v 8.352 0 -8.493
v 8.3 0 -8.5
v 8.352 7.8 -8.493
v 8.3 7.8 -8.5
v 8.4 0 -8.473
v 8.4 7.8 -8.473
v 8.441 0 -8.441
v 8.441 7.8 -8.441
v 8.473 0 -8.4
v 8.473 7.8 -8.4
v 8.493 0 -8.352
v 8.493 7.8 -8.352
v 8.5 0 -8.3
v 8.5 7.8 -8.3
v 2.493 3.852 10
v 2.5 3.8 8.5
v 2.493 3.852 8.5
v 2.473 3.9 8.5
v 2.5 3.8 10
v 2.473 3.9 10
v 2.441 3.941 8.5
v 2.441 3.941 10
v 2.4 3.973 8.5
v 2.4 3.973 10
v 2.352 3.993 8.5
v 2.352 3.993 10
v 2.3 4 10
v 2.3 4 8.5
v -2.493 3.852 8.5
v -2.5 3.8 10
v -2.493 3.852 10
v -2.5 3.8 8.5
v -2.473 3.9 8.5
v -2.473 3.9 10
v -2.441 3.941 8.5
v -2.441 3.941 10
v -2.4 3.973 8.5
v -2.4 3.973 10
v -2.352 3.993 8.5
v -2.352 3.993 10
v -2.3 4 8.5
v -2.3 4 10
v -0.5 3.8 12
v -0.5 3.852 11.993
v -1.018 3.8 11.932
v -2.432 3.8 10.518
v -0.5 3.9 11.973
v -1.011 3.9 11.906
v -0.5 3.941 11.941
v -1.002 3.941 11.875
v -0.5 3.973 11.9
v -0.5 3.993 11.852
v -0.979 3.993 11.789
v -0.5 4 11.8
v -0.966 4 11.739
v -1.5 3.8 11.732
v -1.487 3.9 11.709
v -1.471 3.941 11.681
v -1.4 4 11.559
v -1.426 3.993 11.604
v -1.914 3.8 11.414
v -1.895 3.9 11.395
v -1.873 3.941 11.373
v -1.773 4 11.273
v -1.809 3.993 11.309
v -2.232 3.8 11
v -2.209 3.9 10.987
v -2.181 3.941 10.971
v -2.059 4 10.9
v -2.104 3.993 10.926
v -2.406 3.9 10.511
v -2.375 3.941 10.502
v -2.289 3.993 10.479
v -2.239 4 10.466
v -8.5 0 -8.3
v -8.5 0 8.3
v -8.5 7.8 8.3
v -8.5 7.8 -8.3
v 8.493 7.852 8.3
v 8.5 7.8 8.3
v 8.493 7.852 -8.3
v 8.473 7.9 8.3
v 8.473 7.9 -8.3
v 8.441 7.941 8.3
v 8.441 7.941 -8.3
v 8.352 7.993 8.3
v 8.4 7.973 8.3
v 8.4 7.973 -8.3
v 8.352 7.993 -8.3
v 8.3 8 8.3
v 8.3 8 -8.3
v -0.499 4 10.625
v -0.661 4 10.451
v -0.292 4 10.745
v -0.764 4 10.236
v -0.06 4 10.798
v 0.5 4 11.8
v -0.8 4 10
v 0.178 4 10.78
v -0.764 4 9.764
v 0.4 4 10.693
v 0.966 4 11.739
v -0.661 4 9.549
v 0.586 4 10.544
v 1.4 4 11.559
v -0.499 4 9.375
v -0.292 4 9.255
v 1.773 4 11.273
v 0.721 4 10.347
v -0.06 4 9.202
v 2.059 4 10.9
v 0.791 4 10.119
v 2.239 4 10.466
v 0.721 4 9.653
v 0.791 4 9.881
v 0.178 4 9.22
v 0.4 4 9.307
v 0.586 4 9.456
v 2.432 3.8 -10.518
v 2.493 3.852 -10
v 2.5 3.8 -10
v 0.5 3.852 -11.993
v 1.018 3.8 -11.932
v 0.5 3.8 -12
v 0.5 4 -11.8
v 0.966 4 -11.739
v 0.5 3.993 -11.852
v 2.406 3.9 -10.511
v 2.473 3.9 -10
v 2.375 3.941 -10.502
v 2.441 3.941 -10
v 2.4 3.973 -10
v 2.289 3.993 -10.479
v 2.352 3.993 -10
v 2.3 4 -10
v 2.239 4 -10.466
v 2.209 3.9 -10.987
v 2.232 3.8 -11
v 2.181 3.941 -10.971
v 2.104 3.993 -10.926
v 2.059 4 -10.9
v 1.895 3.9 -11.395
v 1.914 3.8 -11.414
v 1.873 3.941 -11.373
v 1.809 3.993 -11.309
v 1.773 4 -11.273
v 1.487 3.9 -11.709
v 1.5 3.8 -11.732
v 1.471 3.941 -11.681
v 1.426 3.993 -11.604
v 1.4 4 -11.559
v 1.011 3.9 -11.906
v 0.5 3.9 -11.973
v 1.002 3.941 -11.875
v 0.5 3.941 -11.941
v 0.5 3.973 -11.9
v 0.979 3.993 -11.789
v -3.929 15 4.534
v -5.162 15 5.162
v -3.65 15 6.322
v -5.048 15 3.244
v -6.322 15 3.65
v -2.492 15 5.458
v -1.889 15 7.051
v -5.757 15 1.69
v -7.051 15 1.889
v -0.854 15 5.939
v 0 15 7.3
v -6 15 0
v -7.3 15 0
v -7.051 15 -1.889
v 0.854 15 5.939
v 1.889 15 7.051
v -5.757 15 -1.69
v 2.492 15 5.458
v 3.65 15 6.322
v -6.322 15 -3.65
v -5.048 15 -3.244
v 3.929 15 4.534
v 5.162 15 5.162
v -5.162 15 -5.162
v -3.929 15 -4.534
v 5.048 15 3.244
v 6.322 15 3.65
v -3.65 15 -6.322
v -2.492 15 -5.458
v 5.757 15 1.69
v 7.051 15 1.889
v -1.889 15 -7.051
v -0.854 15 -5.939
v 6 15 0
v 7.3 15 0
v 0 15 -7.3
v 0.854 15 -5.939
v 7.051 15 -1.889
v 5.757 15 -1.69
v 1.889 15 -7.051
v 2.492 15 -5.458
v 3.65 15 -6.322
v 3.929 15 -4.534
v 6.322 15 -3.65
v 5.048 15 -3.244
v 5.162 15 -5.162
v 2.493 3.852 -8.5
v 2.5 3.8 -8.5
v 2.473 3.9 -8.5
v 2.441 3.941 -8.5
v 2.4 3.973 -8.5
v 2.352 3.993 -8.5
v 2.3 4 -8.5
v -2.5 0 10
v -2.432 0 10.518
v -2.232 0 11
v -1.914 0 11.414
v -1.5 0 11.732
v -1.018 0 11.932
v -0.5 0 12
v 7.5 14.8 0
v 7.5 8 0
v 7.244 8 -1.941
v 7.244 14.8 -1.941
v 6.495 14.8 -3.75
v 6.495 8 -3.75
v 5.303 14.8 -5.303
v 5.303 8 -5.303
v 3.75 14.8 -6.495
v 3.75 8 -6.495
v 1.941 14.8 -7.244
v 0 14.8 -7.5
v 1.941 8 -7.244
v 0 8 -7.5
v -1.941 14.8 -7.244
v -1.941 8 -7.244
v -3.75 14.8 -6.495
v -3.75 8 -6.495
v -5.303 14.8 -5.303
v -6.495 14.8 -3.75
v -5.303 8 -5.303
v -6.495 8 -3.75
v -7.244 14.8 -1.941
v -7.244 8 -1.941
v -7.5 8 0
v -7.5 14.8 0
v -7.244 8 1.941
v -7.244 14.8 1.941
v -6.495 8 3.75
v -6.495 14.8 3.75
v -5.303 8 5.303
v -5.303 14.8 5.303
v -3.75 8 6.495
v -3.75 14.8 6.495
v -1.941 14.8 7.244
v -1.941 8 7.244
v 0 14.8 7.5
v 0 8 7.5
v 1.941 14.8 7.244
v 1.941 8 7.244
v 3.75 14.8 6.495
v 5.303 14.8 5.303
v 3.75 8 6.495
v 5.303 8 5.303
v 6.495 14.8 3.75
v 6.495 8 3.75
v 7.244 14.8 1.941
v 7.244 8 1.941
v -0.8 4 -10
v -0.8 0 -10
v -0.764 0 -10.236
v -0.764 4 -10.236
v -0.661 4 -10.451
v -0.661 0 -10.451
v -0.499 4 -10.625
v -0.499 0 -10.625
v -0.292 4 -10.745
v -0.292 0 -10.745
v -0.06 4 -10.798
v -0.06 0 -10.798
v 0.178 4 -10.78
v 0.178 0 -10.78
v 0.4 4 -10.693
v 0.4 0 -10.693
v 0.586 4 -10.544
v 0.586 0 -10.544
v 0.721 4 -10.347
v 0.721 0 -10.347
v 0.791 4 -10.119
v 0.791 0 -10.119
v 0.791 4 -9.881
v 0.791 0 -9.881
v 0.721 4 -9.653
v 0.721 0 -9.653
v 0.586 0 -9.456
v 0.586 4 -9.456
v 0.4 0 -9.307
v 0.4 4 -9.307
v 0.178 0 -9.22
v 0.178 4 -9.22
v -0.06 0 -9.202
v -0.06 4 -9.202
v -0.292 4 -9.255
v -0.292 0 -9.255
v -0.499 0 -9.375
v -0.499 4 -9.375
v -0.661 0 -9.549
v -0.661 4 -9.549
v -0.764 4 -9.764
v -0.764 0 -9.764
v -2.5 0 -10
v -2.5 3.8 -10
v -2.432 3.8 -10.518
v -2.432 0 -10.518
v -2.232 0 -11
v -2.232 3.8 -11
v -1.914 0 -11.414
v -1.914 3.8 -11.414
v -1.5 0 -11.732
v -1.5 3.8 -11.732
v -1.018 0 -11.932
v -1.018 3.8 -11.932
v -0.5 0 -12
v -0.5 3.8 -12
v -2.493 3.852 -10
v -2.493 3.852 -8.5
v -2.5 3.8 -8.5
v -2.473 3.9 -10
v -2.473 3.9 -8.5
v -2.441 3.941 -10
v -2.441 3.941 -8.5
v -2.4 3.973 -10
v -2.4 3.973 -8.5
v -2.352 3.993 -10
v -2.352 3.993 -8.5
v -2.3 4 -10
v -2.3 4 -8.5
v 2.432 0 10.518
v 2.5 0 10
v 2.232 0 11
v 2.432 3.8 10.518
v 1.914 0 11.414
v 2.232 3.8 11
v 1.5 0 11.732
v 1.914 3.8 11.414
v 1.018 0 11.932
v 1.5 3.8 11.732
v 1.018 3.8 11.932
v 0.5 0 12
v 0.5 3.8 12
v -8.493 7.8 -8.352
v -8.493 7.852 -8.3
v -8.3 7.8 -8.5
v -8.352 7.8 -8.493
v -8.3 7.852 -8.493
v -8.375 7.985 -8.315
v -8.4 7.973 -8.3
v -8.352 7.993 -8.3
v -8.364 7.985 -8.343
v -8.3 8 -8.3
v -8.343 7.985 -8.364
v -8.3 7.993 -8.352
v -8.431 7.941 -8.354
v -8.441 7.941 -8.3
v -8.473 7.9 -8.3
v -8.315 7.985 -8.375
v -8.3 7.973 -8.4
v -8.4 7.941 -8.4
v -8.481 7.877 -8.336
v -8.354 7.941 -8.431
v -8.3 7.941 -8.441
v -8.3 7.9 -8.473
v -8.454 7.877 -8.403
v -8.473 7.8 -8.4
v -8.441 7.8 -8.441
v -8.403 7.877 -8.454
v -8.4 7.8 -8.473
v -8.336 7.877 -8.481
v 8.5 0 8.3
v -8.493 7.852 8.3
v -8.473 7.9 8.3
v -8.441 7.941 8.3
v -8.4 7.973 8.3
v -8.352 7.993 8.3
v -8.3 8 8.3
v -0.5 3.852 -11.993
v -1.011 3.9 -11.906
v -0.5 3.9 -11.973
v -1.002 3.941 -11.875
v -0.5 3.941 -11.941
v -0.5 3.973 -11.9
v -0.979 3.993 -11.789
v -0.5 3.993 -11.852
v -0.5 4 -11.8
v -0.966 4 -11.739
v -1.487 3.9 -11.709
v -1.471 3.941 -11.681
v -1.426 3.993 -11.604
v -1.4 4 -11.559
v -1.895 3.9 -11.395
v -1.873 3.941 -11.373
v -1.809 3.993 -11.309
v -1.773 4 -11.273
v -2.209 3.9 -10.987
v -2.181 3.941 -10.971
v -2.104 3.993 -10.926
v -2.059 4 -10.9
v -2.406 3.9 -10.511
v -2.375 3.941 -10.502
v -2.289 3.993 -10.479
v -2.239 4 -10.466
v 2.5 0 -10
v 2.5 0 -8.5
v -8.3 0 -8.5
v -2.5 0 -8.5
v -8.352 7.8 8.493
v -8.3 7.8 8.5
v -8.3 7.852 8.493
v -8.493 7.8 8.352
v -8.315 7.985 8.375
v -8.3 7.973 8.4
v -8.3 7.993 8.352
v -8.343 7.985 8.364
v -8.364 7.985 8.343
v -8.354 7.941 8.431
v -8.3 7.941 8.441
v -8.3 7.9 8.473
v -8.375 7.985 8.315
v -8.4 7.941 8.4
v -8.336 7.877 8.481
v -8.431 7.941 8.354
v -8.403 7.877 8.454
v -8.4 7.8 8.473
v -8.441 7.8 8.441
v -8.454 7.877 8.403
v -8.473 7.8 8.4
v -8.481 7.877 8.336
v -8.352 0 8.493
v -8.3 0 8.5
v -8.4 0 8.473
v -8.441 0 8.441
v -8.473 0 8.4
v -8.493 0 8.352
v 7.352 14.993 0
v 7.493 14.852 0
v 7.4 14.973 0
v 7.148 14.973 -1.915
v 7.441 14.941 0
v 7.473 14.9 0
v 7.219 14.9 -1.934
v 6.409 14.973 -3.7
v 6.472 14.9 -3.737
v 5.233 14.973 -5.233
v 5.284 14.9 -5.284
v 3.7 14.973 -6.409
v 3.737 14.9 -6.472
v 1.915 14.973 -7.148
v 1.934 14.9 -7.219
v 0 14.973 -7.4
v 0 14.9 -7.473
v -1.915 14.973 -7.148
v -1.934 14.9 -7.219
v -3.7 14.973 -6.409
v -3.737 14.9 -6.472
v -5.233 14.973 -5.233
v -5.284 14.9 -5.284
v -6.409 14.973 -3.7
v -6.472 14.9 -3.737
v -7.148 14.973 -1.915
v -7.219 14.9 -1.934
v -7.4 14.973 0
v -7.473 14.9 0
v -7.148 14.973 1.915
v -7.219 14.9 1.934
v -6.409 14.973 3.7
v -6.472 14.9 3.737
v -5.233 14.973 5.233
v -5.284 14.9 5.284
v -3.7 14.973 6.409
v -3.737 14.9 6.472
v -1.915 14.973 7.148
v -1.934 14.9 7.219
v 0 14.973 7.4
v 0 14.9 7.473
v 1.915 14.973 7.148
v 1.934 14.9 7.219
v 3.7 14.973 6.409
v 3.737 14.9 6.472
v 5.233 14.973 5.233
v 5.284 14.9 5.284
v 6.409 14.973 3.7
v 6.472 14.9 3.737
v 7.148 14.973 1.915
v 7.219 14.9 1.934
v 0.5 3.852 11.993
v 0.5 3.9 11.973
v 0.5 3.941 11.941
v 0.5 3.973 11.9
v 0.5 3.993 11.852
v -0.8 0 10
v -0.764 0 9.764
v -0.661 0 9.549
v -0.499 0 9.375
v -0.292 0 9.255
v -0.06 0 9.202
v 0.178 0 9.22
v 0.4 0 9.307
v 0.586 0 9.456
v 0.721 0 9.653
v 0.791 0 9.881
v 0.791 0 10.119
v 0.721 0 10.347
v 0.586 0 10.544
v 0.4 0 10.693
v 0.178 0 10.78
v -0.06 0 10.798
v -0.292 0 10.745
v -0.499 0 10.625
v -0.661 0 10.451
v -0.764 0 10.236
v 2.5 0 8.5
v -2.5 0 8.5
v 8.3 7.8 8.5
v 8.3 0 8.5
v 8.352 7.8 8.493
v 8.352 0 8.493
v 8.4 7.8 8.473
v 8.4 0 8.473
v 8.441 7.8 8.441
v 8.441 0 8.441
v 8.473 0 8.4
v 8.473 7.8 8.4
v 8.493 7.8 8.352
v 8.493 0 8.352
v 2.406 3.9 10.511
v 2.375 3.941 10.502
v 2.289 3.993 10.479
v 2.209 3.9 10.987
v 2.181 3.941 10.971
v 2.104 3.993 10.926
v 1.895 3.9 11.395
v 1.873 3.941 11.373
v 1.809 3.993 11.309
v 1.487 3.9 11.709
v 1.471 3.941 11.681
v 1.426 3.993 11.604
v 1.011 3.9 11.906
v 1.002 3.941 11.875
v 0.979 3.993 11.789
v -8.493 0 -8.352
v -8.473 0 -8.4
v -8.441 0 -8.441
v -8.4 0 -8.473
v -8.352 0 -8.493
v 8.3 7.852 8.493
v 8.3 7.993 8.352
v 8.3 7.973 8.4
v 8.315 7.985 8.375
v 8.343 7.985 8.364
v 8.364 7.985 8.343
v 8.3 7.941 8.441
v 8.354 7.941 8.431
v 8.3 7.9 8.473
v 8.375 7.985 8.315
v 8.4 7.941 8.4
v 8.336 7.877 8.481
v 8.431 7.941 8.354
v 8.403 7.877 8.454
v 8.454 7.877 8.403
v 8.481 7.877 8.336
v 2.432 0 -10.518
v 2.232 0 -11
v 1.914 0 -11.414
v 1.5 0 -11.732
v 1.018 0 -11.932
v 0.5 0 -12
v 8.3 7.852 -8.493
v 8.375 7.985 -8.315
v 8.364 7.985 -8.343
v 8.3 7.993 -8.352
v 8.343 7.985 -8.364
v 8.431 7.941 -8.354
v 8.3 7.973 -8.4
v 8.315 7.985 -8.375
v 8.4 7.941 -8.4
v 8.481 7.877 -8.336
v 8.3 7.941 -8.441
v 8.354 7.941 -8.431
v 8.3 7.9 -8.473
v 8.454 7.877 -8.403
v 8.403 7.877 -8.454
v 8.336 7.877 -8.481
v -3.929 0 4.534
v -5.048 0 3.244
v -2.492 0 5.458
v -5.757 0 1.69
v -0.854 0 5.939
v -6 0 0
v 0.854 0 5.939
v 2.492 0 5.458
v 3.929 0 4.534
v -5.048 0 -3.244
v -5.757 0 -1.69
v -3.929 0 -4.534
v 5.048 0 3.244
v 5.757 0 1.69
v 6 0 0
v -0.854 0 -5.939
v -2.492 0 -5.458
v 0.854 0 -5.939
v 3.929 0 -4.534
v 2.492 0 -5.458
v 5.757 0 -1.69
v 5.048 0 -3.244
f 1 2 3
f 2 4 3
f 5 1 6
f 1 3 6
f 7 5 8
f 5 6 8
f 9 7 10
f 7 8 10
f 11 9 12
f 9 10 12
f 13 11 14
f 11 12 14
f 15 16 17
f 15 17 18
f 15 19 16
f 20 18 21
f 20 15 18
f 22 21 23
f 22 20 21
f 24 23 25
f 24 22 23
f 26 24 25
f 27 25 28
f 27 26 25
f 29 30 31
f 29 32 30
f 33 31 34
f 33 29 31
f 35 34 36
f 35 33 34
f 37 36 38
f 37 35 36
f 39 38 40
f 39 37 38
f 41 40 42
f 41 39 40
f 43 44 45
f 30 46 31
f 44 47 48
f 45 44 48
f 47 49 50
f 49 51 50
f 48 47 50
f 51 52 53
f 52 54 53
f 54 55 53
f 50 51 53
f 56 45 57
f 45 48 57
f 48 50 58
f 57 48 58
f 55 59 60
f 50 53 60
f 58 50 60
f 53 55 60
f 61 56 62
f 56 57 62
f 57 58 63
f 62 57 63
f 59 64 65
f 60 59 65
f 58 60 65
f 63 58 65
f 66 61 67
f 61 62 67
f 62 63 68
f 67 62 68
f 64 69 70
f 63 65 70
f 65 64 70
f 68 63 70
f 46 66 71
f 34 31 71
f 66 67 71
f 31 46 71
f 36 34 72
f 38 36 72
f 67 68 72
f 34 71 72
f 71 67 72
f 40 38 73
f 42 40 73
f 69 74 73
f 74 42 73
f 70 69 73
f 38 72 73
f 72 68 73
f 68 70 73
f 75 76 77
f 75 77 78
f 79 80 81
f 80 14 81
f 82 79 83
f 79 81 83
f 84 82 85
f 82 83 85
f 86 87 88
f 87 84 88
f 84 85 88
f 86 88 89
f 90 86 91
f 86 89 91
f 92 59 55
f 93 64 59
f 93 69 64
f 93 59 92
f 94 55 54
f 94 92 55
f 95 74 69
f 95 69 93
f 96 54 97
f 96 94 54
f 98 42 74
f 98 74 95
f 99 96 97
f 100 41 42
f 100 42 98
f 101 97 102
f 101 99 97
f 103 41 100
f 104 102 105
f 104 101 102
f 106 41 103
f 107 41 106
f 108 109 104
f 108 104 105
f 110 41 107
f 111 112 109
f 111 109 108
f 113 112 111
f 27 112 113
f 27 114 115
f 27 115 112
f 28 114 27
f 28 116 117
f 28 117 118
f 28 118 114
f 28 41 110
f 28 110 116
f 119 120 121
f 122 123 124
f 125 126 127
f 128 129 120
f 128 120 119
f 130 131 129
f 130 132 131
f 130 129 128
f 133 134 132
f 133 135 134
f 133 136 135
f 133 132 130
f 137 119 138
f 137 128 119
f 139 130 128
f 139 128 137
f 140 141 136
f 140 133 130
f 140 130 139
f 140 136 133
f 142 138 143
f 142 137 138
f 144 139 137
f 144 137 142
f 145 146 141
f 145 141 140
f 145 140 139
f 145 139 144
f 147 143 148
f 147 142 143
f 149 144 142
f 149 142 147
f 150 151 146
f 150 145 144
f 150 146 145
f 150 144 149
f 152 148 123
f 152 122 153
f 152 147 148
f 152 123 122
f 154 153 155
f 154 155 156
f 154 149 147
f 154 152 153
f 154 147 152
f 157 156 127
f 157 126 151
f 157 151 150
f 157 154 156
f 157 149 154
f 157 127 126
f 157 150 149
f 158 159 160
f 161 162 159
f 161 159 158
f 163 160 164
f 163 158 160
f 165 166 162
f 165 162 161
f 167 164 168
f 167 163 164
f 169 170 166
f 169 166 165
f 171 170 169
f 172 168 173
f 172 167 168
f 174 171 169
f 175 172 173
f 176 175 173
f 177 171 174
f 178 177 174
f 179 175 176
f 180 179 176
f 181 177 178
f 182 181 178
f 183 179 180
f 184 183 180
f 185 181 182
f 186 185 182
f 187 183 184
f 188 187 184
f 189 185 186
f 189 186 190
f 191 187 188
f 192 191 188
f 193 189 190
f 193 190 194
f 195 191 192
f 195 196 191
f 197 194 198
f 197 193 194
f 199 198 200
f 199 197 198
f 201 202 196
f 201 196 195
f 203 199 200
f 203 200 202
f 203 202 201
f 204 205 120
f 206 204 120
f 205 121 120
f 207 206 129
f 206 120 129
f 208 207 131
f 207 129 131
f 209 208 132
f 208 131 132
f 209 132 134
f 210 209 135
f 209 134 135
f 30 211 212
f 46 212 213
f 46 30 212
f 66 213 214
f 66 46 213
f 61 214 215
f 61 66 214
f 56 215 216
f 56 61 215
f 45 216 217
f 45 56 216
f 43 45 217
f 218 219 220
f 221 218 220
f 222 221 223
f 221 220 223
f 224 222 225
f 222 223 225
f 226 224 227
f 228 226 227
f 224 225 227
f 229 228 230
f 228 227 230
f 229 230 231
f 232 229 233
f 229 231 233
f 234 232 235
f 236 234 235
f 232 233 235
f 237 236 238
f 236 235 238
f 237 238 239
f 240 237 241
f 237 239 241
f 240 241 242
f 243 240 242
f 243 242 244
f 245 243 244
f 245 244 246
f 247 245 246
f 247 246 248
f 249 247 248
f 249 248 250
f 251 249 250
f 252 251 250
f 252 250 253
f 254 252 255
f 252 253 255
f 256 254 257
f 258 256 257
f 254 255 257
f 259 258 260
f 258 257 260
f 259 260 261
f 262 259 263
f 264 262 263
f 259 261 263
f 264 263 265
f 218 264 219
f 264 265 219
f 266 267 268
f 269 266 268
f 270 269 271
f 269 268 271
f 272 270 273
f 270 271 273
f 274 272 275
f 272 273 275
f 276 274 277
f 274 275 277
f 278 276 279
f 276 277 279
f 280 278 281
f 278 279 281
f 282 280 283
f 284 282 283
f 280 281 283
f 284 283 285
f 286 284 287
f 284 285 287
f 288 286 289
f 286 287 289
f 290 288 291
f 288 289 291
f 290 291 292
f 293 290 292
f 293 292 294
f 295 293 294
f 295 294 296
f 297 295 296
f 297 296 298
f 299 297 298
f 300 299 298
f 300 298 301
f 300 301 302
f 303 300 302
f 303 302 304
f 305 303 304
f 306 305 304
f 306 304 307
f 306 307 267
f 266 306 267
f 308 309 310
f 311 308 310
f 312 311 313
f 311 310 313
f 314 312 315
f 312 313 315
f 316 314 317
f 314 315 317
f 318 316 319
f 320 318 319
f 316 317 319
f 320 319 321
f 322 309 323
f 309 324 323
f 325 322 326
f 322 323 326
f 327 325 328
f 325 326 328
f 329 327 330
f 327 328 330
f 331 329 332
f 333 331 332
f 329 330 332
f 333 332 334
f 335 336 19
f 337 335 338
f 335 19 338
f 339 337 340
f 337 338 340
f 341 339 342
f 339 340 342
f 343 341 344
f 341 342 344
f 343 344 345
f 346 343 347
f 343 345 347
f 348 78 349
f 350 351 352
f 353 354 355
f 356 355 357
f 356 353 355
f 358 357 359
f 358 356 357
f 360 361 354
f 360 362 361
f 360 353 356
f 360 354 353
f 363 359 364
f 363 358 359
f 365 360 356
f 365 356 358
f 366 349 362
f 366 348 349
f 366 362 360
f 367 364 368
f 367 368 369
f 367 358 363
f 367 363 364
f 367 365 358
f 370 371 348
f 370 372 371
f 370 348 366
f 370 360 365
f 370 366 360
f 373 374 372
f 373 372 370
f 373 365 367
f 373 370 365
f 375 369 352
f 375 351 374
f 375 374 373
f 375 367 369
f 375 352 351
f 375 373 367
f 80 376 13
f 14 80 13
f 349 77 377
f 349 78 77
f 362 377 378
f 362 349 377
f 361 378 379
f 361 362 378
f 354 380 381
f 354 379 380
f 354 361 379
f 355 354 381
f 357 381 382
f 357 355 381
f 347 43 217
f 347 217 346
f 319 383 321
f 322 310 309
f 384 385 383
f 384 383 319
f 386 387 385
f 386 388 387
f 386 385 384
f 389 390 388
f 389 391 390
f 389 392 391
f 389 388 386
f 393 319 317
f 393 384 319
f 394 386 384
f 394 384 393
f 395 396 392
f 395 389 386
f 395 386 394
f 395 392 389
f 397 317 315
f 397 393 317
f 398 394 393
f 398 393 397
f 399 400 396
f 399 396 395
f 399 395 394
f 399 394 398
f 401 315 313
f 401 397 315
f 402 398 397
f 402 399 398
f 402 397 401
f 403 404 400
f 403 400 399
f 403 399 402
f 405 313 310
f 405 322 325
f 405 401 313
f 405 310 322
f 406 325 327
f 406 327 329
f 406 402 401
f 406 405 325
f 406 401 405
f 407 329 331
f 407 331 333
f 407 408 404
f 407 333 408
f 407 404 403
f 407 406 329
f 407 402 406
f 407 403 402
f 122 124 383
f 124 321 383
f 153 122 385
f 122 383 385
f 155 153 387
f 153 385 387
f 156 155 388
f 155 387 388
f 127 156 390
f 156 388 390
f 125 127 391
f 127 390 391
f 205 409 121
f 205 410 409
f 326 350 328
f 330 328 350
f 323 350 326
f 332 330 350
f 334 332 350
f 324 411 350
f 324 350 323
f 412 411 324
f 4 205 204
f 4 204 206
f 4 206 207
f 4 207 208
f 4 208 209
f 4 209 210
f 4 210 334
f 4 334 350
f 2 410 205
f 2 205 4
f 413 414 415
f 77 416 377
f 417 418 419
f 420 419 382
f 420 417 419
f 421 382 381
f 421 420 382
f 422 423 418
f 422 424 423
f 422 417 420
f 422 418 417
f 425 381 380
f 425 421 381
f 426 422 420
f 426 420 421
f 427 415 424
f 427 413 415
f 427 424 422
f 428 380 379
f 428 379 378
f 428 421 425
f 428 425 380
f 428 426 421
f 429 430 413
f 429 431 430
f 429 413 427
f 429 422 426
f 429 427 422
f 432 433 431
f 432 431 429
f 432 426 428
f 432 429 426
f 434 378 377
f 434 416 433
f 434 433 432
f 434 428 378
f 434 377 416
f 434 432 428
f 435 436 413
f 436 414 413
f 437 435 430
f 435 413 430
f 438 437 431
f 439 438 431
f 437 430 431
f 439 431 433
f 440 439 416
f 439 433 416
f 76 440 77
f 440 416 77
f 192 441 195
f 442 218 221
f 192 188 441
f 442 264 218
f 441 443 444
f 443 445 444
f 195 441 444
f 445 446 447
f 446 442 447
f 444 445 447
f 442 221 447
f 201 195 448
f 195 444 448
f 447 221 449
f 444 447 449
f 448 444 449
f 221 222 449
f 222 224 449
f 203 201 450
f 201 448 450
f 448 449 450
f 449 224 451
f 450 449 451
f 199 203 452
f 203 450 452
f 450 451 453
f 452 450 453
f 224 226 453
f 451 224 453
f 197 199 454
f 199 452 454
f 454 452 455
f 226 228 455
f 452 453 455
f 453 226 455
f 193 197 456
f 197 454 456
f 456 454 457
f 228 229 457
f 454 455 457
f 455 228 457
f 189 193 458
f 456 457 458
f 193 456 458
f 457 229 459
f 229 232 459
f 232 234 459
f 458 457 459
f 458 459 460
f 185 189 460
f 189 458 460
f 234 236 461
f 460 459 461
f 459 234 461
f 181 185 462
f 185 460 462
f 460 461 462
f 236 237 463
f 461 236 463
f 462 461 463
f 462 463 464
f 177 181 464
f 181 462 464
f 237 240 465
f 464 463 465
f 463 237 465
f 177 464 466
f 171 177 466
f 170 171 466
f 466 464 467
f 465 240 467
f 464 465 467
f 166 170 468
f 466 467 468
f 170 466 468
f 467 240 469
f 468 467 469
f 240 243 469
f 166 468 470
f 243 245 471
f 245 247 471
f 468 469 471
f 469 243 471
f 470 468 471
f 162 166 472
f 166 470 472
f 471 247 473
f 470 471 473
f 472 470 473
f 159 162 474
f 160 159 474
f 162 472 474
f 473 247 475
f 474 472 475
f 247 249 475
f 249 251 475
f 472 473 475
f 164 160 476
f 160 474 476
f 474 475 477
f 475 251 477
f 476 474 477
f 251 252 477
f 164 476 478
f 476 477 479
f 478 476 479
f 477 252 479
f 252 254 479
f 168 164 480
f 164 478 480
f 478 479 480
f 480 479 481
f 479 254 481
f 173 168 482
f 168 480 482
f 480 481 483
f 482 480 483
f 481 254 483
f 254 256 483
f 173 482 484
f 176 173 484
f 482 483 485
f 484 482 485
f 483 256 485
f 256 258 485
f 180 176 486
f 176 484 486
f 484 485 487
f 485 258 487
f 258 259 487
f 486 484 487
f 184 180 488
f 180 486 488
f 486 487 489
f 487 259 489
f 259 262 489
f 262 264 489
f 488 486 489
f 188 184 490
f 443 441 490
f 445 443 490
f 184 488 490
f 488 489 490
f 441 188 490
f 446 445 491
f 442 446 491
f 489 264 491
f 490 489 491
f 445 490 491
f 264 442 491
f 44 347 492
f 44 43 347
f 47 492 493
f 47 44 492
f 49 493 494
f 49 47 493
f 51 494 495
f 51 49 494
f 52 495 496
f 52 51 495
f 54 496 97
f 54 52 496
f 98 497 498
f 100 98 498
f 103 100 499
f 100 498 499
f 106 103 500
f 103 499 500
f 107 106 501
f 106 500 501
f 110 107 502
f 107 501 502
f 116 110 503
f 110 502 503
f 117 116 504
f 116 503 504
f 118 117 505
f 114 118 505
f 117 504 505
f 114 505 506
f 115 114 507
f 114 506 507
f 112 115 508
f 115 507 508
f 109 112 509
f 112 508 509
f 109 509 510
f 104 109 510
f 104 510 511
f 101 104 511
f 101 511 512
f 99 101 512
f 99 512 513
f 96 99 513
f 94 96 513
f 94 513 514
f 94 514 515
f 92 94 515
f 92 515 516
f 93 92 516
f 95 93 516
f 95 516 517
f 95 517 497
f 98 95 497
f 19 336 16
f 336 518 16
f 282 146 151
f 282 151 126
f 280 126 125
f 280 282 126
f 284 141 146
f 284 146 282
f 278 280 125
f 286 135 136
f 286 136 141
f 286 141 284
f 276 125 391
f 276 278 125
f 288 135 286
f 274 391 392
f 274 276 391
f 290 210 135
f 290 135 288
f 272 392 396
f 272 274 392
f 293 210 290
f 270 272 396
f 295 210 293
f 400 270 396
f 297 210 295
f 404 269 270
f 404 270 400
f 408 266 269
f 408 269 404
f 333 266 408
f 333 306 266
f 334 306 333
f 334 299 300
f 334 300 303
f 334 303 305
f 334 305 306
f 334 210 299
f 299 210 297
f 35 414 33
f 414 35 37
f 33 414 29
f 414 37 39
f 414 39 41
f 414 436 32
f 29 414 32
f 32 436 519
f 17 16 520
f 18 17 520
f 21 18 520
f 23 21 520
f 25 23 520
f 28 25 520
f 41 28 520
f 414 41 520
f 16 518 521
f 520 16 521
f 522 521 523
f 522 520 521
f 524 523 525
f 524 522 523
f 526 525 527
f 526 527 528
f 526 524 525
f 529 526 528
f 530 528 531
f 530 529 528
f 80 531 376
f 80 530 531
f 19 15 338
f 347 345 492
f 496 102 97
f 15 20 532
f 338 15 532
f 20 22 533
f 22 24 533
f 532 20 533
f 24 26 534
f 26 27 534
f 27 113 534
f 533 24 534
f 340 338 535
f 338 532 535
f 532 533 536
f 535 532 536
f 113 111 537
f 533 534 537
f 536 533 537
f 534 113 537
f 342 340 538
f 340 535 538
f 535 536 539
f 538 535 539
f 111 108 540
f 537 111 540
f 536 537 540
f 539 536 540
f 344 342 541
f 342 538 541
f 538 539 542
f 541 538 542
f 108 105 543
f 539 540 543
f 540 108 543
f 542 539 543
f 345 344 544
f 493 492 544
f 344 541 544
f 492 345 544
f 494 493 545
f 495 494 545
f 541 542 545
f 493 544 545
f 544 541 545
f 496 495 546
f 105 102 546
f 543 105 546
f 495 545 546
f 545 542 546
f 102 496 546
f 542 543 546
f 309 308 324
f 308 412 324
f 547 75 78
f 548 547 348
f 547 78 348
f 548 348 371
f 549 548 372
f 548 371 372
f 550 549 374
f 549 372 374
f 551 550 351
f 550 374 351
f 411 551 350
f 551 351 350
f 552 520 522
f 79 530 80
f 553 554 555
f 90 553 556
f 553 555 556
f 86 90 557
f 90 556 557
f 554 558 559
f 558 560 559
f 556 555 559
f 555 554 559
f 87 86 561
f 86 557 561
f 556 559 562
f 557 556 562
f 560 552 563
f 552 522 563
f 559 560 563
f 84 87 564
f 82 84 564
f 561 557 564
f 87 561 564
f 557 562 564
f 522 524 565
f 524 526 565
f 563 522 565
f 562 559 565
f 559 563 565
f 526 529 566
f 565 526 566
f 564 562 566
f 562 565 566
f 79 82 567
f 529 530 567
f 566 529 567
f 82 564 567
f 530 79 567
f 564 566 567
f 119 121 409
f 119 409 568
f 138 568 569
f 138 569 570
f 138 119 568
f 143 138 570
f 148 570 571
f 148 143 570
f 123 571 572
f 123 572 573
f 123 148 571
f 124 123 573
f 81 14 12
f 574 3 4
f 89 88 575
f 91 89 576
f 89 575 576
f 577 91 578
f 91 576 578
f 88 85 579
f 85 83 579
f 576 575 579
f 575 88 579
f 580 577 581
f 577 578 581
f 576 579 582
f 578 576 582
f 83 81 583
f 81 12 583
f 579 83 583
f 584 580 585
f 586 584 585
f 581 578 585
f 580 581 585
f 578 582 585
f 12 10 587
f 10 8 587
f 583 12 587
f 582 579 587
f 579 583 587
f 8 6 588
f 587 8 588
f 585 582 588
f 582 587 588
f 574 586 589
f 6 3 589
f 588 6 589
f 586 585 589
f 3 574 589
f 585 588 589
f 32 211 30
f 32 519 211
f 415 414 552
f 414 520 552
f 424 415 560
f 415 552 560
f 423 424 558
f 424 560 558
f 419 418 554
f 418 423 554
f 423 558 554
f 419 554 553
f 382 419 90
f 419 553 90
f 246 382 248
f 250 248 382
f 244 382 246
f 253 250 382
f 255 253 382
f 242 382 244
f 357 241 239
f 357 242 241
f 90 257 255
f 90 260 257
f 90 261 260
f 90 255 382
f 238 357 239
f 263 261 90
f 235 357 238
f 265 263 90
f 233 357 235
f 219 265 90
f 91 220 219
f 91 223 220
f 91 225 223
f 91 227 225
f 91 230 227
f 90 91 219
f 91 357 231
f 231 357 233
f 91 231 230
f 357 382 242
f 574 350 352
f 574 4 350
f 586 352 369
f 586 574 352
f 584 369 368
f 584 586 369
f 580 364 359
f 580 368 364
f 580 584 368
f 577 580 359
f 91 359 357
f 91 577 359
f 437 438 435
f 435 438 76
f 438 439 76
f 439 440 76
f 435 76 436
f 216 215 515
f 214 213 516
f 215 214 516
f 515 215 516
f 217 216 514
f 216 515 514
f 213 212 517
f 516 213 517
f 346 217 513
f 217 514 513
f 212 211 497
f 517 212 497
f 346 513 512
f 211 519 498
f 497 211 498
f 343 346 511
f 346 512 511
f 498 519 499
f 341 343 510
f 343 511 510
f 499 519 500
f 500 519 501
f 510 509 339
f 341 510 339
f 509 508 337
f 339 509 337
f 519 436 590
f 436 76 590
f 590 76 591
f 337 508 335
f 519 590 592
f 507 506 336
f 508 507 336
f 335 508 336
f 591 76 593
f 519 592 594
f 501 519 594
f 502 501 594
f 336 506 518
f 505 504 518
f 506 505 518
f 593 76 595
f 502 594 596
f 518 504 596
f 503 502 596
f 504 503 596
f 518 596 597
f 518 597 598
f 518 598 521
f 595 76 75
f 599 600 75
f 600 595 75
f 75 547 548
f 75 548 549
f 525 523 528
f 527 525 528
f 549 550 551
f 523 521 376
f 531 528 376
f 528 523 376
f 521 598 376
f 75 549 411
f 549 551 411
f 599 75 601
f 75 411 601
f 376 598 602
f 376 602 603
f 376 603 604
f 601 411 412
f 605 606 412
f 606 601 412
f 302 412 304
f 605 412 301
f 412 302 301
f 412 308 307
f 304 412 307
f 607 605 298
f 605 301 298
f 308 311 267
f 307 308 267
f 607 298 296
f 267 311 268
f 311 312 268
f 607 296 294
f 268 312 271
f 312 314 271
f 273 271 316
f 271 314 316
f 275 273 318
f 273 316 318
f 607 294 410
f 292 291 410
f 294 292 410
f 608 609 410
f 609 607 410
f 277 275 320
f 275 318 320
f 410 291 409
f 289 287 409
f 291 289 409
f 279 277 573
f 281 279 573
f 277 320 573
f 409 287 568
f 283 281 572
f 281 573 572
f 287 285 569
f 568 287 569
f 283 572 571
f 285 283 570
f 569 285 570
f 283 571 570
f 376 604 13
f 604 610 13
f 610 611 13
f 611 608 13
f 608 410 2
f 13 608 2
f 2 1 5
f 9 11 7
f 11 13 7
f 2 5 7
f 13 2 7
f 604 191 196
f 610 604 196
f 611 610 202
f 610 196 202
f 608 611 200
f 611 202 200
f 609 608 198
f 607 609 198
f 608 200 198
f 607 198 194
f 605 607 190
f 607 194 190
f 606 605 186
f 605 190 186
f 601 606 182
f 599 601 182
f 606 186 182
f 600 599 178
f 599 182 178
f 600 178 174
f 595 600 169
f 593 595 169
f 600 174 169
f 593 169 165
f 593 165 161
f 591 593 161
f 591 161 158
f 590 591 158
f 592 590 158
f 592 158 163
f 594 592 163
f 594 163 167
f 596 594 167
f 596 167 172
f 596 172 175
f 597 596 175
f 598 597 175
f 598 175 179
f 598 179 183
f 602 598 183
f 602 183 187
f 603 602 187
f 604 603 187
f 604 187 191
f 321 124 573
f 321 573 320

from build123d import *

# Parameters (mm, degrees)
SKETCH1_W             = 17
SKETCH1_H             = 17
BOSS_EXTRUDE1_DEPTH   = 8
SKETCH2_W             = 5
SKETCH2_H             = 4
BOSS_EXTRUDE2_DEPTH   = 3.5
SKETCH3_W             = 5
SKETCH3_H             = 4
BOSS_EXTRUDE3_DEPTH   = 3.5
M2X0_4_TAPPED_HOLE1_D = 1.6
FILLET1_R             = 2
SKETCH8_R             = 7.5
BOSS_EXTRUDE4_DEPTH   = 7
SKETCH9_R             = 6
CUT_EXTRUDE1_DEPTH    = 16
FILLET2_R             = 0.2


with BuildPart() as part:
    # Sketch1 → Boss-Extrude1 (new body)
    with BuildSketch(Plane(origin=(0, 0, 0), x_dir=(1, 0, 0), z_dir=(0, 1, 0))):
        Rectangle(SKETCH1_W, SKETCH1_H)
    extrude(amount=BOSS_EXTRUDE1_DEPTH)

    # Sketch2 → Boss-Extrude2 (add)
    with BuildSketch(Plane.XY.offset(8.5)):
        with Locations((0, 2)):
            Rectangle(SKETCH2_W, SKETCH2_H)
    extrude(amount=BOSS_EXTRUDE2_DEPTH)

    # Sketch3 → Boss-Extrude3 (add)
    with BuildSketch(Plane(origin=(0, 0, -8.5), x_dir=(-1, 0, 0), z_dir=(0, 0, -1))):
        with Locations((0, 2)):
            Rectangle(SKETCH3_W, SKETCH3_H)
    extrude(amount=BOSS_EXTRUDE3_DEPTH)

    # M2x0.4 Tapped Hole1 (through all)
    with Locations(Plane(origin=(0, 4, 0), x_dir=(1, 0, 0), z_dir=(0, 1, 0))):
        with Locations((0, -10), (0, 10)):
            Hole(M2X0_4_TAPPED_HOLE1_D / 2)

    # Fillet1
    fillet1_edges = [part.edges().sort_by_distance(p)[0] for p in [
        (-2.5, 2, 12),
        (2.5, 2, 12),
        (-2.5, 2, -12),
        (2.5, 2, -12),
    ]]
    fillet(fillet1_edges, radius=FILLET1_R)

    # Sketch8 → Boss-Extrude4 (add)
    with BuildSketch(Plane(origin=(0, 8, 0), x_dir=(1, 0, 0), z_dir=(0, 1, 0))):
        Circle(SKETCH8_R)
    extrude(amount=BOSS_EXTRUDE4_DEPTH)

    # Sketch9 → Cut-Extrude1 (cut, through all)
    with BuildSketch(Plane(origin=(0, 15, 0), x_dir=(1, 0, 0), z_dir=(0, 1, 0))):
        Circle(SKETCH9_R)
    extrude(amount=-CUT_EXTRUDE1_DEPTH, mode=Mode.SUBTRACT)

    # Fillet2
    fillet2_edges = [part.edges().sort_by_distance(p)[0] for p in [
        (-7.5, 15, 0),
        (8.5, 4, 8.5),
        (8.5, 4, -8.5),
        (-8.5, 4, 8.5),
        (-8.5, 4, -8.5),
        (2.5, 4, 9.25),
        (1.914213562, 4, 11.414213562),
        (-1.914213562, 4, 11.414213562),
        (-2.5, 4, 9.25),
        (0, 8, 8.5),
        (8.5, 8, 0),
        (-8.5, 8, 0),
        (0, 8, -8.5),
        (2.5, 4, -9.25),
        (1.914213562, 4, -11.414213562),
        (-1.914213562, 4, -11.414213562),
        (-2.5, 4, -9.25),
        (0, 4, 12),
        (0, 4, -12),
    ]]
    fillet(fillet2_edges, radius=FILLET2_R)


solid = part.part
